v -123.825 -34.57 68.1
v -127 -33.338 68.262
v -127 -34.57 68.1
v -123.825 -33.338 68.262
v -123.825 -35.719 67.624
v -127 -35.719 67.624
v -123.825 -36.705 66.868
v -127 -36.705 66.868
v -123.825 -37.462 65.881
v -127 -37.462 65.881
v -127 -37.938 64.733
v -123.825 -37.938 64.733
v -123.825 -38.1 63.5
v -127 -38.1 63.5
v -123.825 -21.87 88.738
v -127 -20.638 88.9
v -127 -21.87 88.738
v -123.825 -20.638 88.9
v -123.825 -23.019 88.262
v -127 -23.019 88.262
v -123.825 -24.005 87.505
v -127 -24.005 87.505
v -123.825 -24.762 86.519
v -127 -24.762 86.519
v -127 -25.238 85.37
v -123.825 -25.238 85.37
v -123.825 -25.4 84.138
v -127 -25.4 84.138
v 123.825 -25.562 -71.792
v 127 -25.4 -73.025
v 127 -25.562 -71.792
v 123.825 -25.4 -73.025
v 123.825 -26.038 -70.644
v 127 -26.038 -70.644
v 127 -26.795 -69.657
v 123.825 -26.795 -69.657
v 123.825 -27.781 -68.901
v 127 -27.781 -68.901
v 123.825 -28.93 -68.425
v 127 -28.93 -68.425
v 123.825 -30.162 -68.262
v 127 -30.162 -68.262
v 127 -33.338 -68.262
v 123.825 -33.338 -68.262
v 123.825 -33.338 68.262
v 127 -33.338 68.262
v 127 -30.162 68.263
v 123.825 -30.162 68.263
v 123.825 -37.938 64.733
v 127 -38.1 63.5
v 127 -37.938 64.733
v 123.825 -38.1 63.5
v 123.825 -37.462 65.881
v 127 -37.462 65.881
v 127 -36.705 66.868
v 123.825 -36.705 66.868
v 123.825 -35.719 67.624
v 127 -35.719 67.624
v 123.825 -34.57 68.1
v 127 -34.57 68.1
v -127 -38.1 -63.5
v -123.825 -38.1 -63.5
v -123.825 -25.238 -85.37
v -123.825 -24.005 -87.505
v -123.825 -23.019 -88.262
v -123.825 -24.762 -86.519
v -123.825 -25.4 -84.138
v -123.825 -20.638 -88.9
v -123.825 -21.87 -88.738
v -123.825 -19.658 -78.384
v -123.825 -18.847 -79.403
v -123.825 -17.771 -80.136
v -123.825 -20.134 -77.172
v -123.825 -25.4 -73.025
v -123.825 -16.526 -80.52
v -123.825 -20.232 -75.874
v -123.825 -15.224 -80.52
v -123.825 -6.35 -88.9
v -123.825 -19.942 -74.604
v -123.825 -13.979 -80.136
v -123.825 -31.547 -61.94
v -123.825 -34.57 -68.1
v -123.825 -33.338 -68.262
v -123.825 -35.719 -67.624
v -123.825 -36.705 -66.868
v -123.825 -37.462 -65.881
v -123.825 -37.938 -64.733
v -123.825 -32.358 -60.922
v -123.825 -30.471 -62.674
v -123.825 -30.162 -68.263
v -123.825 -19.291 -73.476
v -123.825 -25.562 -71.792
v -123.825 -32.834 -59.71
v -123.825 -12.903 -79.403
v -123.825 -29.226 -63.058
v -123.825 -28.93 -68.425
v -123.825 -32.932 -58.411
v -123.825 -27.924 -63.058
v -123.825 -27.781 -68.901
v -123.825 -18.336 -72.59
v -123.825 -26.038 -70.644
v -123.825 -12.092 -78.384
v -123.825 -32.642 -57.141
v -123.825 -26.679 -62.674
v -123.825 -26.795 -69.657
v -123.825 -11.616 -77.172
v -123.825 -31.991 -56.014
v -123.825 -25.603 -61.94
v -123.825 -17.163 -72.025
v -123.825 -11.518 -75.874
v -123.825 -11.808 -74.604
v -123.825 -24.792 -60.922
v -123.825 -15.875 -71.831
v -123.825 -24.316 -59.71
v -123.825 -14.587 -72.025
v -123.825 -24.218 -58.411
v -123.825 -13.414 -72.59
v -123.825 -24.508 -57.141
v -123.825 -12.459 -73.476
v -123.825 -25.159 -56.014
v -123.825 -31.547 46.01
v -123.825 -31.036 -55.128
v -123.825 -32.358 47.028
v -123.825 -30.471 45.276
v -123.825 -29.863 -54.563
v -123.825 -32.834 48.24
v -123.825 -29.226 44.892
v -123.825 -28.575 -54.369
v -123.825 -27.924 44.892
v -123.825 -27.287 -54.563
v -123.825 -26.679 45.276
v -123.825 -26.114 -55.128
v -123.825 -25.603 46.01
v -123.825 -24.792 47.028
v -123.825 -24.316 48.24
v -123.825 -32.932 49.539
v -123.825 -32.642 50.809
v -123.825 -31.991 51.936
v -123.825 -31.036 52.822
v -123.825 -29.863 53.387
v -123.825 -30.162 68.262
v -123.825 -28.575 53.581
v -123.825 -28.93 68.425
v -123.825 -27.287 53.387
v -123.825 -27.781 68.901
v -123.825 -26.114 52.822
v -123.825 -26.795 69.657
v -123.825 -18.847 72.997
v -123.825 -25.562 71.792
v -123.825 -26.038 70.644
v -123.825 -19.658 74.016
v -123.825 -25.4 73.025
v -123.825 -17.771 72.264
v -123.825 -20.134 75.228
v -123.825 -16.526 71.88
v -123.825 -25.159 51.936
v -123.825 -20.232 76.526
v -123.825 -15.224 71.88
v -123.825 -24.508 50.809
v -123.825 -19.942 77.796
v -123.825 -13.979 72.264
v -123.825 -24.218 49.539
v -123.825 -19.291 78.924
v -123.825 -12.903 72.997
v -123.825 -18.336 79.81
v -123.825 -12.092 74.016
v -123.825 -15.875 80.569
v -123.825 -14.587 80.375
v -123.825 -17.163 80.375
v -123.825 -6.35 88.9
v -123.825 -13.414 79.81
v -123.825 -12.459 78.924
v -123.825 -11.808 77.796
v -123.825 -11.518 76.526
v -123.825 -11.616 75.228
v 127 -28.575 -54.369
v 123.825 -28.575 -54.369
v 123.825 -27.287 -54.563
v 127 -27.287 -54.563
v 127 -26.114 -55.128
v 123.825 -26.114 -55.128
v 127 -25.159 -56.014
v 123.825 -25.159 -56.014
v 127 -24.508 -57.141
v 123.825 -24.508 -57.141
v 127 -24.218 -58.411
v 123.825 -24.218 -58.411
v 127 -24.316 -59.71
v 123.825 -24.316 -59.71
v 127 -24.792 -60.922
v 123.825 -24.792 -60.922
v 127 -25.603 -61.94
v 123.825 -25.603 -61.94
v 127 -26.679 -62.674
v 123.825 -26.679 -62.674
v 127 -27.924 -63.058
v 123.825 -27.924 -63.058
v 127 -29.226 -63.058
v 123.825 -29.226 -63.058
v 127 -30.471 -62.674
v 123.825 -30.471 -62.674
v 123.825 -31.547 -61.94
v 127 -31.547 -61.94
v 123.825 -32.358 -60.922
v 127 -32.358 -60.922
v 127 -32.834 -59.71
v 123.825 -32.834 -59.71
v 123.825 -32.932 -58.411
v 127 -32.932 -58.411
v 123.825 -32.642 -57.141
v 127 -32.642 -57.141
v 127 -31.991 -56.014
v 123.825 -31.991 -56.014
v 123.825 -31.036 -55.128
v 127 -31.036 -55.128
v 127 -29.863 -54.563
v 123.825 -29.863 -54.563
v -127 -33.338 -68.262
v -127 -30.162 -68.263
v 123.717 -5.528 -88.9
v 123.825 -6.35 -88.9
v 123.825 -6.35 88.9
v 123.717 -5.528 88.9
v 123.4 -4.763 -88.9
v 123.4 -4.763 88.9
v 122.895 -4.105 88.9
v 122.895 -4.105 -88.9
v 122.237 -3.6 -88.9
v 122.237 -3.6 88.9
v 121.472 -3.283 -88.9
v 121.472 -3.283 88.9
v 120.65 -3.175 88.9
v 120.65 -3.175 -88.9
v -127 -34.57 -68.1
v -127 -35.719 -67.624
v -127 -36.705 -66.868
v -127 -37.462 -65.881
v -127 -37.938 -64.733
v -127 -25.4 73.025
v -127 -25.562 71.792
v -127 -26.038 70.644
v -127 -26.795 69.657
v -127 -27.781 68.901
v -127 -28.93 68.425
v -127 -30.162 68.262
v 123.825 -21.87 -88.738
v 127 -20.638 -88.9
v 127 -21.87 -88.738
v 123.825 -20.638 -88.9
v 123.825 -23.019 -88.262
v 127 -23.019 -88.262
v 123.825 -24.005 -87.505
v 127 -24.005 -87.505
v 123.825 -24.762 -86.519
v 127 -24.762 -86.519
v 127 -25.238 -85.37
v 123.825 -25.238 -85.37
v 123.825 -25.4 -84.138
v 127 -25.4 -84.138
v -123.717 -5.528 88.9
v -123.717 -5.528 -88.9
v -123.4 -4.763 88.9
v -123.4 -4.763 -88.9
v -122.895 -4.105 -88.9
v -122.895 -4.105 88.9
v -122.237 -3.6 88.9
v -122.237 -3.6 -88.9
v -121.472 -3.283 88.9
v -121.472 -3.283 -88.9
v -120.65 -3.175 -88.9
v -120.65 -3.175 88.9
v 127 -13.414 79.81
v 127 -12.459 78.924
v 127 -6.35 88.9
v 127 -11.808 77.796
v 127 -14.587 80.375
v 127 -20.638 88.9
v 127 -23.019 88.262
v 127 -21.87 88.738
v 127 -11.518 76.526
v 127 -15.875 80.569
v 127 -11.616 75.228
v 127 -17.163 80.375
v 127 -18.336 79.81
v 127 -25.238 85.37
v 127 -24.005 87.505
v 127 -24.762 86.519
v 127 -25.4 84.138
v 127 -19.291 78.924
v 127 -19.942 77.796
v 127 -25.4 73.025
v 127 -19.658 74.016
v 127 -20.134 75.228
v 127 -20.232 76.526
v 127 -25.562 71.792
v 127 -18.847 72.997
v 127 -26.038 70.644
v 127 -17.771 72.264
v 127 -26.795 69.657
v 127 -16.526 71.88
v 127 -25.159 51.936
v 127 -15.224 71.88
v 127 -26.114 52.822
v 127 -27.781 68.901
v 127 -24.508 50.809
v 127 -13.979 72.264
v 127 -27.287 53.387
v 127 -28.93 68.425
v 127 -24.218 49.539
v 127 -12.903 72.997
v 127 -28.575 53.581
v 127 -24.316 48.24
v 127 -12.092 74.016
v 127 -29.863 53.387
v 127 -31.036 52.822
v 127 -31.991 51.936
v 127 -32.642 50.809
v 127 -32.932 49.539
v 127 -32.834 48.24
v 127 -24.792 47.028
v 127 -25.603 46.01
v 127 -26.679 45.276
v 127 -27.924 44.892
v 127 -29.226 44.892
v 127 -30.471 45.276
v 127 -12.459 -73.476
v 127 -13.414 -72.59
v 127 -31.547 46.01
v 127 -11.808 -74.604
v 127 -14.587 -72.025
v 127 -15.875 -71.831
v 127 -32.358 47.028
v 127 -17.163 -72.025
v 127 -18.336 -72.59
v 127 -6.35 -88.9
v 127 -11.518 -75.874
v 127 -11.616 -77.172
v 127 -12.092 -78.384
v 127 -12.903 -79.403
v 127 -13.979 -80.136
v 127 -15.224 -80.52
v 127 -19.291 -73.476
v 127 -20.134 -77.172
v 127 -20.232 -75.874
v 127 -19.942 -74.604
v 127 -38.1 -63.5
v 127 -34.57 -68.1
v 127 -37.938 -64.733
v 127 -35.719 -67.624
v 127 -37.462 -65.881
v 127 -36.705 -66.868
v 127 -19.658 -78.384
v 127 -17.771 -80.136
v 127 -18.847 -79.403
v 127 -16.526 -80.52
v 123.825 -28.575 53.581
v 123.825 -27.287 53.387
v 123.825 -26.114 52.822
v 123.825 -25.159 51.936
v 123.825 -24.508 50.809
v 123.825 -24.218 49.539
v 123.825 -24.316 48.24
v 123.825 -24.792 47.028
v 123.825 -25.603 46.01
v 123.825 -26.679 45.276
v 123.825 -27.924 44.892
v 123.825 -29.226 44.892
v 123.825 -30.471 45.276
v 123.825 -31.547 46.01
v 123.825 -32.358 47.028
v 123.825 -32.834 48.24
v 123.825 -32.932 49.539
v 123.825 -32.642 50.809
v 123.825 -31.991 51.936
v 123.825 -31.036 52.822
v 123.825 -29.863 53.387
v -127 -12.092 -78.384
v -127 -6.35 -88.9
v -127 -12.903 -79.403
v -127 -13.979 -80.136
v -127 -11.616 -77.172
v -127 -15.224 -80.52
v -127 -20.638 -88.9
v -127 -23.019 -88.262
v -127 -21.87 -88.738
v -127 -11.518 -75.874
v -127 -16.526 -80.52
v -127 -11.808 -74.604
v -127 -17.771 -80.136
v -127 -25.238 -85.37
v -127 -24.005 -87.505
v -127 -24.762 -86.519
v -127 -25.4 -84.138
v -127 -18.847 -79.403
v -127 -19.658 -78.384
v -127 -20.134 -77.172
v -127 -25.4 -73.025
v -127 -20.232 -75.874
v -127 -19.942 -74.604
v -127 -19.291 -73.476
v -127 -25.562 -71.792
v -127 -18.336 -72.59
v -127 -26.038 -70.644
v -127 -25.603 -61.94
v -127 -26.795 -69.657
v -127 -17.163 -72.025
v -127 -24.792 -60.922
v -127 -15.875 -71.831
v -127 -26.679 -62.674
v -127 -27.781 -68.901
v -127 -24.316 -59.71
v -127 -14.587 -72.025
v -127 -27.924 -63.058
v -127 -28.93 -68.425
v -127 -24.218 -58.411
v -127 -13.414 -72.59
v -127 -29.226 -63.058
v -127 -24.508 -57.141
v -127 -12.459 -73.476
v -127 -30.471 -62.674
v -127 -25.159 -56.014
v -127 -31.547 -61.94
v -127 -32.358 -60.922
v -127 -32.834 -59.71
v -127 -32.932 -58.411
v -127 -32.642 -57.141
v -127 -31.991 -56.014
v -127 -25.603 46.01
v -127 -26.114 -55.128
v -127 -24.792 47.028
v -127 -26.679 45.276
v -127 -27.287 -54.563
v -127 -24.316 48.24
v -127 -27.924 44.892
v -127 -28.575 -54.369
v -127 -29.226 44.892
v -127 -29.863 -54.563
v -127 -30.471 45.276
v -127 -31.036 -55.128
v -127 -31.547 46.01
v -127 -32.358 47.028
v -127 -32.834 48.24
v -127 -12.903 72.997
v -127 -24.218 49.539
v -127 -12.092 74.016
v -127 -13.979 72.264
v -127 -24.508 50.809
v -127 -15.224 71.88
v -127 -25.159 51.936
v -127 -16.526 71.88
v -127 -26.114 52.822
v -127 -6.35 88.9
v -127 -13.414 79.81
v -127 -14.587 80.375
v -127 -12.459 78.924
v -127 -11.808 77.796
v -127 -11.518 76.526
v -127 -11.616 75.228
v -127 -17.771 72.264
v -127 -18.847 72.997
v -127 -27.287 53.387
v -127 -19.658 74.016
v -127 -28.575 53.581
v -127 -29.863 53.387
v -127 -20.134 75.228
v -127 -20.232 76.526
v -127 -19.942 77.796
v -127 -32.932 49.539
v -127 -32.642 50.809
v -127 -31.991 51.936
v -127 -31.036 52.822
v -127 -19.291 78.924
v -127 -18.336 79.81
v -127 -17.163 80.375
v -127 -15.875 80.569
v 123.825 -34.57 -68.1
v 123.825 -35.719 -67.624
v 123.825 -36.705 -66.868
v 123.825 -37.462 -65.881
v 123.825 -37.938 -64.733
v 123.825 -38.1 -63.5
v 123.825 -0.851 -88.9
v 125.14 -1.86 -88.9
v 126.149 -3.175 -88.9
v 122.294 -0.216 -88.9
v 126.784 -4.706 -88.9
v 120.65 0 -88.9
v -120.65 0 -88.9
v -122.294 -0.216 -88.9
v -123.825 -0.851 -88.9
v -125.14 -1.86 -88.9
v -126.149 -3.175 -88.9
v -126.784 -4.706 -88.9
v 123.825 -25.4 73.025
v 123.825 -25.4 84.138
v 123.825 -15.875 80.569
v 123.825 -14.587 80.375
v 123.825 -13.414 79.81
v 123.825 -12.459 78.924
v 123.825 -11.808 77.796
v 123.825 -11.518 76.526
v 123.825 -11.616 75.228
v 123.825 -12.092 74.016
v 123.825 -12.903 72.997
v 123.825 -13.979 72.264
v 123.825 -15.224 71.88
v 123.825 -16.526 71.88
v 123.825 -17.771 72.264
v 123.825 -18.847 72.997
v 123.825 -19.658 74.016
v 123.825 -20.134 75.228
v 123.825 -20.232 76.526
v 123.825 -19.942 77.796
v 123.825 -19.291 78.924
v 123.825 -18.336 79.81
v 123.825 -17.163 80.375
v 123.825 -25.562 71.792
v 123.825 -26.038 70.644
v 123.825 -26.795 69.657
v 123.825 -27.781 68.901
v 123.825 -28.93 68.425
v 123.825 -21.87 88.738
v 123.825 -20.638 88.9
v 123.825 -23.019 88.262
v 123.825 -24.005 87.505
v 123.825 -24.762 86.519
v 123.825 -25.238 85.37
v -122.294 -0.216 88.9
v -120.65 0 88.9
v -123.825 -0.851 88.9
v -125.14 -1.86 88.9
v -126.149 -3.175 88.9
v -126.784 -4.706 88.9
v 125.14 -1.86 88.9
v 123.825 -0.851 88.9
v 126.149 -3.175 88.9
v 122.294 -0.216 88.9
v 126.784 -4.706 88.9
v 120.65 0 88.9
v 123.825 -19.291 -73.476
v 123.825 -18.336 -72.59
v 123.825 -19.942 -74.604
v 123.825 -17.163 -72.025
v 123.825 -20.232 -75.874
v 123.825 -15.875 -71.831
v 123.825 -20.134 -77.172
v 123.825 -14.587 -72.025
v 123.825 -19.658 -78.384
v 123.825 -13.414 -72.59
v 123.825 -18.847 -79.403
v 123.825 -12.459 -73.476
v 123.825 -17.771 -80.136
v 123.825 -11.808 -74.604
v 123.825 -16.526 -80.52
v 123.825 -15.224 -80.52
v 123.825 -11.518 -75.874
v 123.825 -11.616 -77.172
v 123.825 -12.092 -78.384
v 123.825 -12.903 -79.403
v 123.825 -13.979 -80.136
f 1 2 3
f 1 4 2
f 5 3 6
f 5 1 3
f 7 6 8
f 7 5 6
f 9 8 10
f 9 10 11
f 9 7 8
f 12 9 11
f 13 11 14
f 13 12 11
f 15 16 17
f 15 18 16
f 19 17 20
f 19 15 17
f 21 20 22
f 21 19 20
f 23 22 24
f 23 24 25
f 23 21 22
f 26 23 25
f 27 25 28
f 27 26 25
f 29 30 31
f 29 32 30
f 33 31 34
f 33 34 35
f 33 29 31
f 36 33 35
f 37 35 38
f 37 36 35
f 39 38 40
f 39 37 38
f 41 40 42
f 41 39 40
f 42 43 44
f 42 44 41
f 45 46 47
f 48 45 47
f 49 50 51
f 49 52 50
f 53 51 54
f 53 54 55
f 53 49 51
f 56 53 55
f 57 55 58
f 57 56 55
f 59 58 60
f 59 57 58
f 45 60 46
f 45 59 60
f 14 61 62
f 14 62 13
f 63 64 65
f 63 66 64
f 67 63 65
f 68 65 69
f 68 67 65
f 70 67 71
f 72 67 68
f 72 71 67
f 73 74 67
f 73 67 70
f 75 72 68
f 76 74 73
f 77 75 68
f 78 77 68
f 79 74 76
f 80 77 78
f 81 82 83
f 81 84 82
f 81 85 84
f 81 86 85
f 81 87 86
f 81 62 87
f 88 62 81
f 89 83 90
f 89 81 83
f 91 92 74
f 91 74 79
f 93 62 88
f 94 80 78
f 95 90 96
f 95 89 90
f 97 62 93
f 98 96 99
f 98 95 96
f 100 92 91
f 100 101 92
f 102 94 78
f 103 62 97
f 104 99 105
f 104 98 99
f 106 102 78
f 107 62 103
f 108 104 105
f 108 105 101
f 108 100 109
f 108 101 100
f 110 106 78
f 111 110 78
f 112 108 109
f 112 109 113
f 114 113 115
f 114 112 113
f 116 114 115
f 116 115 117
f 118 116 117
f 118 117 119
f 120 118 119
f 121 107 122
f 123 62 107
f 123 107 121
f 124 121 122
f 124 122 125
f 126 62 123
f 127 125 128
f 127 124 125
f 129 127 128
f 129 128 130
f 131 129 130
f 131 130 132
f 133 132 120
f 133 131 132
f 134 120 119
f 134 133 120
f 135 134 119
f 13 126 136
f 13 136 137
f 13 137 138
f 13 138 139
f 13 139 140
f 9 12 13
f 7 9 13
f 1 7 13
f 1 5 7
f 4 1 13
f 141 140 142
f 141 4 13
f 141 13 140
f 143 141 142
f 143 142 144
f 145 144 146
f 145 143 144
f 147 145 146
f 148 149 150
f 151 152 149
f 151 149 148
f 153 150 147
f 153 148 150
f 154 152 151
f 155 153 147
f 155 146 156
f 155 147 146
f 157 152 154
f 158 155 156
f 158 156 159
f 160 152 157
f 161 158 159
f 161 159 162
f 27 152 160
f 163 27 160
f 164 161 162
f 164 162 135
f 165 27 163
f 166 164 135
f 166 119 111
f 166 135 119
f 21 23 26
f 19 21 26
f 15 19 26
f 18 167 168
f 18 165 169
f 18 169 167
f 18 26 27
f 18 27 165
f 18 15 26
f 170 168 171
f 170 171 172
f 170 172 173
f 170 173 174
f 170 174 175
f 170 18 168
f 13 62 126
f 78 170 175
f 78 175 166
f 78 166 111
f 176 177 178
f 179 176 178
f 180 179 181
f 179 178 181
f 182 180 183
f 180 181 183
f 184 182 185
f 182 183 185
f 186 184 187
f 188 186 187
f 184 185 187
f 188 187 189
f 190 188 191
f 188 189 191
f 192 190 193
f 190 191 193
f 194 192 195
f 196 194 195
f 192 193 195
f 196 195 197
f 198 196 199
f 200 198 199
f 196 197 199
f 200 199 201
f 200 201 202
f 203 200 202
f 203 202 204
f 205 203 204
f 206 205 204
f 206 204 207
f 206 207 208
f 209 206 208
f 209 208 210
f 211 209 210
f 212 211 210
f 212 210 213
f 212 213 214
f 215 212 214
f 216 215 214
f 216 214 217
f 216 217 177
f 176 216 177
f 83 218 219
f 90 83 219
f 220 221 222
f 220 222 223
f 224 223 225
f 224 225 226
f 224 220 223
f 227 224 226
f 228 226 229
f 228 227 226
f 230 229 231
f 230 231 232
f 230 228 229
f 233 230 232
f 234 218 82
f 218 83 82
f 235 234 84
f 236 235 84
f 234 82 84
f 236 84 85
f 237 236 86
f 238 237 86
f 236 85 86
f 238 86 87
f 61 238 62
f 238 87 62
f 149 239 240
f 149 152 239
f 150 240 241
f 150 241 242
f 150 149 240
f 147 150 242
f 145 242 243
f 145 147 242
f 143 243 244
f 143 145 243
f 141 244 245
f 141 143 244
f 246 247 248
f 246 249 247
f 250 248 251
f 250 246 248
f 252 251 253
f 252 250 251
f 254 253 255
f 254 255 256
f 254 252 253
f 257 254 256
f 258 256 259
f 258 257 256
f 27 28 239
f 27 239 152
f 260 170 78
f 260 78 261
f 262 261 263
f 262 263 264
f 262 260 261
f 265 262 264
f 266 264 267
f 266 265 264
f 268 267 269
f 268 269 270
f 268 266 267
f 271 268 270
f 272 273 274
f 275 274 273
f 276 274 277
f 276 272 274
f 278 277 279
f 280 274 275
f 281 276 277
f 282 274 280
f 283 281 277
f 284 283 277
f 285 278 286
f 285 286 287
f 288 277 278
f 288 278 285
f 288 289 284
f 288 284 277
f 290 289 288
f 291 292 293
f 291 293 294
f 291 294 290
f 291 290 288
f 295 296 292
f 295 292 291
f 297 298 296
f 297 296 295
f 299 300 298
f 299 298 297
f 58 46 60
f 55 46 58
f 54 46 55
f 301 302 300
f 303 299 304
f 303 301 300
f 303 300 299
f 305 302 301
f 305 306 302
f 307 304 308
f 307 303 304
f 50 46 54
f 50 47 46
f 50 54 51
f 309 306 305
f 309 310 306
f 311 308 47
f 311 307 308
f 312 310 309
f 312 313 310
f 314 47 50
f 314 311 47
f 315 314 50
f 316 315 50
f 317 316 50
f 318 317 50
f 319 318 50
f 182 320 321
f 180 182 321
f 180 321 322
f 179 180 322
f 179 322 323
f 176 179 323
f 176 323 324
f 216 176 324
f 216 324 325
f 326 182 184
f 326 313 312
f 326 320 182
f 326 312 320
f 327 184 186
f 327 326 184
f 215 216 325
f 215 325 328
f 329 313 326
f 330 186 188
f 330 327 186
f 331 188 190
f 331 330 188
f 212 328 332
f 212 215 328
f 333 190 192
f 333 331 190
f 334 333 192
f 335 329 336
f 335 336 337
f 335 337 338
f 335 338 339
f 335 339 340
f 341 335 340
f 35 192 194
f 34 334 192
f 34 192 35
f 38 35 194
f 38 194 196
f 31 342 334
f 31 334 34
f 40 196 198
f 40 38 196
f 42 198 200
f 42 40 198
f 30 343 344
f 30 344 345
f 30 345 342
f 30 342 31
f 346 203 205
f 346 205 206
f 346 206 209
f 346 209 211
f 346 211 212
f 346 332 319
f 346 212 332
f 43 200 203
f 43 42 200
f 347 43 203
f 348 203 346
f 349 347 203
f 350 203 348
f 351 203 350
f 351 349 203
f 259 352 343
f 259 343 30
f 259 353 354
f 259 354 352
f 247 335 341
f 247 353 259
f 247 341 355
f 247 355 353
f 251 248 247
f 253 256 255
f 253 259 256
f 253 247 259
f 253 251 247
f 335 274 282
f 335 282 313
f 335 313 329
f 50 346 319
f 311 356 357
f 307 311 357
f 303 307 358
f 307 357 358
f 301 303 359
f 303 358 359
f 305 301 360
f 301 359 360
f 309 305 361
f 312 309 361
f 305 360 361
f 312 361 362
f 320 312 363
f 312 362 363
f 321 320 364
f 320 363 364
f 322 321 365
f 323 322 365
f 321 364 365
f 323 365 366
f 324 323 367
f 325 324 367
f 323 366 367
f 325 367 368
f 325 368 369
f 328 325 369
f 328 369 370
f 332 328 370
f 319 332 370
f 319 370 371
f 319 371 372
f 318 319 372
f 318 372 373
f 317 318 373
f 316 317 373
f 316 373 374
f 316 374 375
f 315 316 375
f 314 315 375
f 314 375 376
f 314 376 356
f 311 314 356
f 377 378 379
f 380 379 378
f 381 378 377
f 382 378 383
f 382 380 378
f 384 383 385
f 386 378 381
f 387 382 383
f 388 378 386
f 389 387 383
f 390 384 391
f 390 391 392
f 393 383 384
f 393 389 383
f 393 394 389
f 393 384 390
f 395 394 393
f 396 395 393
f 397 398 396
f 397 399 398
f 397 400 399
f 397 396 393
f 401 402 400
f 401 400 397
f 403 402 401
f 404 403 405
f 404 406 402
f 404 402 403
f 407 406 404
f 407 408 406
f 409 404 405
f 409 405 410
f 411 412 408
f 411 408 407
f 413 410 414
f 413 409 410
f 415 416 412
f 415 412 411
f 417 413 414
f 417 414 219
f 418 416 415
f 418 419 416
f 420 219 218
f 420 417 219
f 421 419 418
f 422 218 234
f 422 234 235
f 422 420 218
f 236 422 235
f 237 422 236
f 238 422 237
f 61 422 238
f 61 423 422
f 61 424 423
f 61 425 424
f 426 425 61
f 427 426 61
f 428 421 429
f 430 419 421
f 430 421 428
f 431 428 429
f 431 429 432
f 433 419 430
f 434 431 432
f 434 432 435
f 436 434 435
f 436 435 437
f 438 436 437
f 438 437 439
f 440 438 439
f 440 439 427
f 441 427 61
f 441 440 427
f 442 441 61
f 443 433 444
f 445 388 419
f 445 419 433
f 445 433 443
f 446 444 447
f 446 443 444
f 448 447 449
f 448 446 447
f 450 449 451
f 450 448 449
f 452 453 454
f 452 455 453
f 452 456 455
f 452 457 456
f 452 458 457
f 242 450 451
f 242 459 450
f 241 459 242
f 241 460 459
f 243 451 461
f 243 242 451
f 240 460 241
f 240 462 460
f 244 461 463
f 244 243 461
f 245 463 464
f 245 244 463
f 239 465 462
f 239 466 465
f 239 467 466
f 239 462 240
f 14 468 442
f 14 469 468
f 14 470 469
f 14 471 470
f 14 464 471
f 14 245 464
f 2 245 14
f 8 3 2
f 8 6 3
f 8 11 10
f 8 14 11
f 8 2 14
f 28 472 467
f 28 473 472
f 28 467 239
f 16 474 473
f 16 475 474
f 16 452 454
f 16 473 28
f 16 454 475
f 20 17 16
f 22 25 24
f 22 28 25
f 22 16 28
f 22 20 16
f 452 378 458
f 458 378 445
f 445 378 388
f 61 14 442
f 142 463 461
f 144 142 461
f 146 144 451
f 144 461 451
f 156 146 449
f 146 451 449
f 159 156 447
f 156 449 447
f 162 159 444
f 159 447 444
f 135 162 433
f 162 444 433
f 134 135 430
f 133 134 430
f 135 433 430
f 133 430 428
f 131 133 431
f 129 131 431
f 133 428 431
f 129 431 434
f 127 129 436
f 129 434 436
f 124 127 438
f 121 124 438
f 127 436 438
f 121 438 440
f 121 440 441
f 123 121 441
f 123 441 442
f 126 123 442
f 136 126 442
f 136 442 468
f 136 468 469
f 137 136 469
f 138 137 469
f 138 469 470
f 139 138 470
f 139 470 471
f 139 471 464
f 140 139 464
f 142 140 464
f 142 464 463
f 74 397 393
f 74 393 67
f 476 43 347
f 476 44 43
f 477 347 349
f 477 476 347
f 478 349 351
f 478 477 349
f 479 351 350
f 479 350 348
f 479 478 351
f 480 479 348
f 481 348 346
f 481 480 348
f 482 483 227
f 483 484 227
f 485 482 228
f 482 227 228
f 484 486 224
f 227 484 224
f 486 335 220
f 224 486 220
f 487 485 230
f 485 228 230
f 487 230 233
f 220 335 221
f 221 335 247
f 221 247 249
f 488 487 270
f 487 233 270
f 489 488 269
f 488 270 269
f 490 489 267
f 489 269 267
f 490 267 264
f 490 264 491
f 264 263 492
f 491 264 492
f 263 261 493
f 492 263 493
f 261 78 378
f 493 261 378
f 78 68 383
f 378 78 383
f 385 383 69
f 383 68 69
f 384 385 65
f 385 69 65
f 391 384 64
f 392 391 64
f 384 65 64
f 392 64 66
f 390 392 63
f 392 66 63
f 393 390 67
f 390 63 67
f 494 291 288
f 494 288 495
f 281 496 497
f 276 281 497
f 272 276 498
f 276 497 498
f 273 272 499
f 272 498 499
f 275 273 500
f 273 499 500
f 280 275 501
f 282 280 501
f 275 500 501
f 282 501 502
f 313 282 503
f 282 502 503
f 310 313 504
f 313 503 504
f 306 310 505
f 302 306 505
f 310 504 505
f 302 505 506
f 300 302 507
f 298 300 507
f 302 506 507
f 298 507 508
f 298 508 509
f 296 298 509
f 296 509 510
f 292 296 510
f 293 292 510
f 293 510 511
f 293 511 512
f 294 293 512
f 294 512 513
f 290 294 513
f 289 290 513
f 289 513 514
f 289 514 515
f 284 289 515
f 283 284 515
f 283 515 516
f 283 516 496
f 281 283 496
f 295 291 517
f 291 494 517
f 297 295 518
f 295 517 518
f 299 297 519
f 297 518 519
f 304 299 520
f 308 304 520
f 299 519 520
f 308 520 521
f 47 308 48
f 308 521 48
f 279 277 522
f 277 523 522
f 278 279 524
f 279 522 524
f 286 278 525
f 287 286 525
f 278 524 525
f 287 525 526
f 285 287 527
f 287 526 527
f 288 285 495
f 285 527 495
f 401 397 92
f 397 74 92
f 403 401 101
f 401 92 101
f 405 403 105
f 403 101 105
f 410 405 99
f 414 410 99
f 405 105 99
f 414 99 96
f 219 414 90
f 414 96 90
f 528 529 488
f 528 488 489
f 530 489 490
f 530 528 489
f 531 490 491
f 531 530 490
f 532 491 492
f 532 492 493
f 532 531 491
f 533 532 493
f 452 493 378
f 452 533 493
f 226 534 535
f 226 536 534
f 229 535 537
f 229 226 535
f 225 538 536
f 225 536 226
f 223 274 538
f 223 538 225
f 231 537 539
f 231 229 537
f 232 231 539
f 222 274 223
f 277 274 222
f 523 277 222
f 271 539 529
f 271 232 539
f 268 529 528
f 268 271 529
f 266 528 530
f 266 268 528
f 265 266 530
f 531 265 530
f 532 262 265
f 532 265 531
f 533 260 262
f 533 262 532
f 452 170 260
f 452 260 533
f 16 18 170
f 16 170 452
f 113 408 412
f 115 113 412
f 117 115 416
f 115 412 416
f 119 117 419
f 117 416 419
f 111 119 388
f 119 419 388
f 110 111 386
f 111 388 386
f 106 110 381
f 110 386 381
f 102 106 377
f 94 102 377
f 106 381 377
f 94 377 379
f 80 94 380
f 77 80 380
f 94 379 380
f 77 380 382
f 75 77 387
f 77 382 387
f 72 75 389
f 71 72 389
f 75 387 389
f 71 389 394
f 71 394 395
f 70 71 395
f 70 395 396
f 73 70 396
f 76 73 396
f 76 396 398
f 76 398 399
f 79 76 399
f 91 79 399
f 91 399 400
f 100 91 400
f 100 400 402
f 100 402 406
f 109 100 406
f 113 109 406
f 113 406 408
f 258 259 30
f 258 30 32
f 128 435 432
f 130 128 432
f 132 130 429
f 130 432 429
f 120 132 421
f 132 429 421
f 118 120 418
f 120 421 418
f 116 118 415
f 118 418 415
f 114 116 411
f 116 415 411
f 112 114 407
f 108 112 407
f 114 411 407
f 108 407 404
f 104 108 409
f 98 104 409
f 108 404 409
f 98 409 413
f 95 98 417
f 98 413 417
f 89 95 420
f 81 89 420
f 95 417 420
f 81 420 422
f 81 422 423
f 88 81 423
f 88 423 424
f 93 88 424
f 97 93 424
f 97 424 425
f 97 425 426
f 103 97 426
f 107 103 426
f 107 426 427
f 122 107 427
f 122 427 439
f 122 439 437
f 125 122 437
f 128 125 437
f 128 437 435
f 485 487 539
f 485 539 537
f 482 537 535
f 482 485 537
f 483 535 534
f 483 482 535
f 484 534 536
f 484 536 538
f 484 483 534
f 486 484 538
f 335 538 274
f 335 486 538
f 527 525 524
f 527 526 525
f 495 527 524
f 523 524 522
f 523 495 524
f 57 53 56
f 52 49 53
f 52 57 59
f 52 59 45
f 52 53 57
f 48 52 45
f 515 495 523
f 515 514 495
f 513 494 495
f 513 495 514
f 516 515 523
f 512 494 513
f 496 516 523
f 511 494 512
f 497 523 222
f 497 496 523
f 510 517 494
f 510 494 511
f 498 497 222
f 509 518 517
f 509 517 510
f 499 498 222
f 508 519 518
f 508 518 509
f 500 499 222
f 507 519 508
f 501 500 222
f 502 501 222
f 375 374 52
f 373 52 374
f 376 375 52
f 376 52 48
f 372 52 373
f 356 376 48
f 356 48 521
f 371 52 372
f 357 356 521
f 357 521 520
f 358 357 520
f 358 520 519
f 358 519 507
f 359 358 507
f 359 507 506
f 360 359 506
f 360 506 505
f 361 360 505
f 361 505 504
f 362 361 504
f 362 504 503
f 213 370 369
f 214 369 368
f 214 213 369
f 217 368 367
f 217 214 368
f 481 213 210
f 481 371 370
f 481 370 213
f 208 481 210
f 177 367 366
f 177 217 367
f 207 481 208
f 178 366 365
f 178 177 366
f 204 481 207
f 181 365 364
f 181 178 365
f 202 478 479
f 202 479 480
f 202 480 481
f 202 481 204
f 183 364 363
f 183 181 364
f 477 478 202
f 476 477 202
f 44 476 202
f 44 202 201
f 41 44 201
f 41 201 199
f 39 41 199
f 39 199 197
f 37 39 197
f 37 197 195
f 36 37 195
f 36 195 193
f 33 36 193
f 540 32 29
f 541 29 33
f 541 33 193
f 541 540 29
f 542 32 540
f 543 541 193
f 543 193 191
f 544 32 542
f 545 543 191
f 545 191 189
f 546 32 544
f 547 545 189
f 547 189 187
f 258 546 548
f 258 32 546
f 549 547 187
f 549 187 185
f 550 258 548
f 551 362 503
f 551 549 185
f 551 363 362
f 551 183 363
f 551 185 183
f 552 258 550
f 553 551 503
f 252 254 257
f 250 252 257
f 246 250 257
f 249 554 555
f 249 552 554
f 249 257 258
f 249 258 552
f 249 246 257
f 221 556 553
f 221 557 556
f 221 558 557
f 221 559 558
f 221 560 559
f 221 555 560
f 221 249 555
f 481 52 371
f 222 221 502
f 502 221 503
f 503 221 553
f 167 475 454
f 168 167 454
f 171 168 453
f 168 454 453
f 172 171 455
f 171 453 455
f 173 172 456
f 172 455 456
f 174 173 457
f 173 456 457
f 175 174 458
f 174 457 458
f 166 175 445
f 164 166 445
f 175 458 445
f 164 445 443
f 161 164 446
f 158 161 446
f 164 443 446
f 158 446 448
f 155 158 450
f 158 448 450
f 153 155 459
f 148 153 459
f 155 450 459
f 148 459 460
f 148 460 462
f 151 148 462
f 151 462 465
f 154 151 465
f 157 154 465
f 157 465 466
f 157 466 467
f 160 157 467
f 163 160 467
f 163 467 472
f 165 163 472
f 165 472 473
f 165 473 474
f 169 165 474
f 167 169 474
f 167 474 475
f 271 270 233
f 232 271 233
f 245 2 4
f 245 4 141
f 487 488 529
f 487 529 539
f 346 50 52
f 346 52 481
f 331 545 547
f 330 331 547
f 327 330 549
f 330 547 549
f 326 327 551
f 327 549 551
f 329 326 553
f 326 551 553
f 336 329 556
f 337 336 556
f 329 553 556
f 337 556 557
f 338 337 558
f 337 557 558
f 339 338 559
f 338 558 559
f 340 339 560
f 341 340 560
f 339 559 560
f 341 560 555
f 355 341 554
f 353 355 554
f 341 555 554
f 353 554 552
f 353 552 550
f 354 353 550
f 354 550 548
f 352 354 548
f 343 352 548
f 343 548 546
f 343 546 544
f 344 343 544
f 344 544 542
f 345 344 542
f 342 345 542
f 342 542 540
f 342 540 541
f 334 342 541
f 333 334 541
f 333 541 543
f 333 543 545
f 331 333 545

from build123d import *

# Parameters (mm, degrees)
SKETCH1_W                                 = 241.3
SKETCH1_H                                 = 177.8
BASE_FLANGE1_DEPTH                        = 3.175
EDGE_FLANGE1_DEPTH                        = 177.8
EDGE_FLANGE1_BEND_DEPTH                   = 177.8
SKETCH13_W                                = 136.525
SKETCH13_H                                = 12.7
BOSS_EXTRUDE1_DEPTH                       = 3.175
SKETCH39_W                                = 136.525
SKETCH39_H                                = 12.7
BOSS_EXTRUDE2_DEPTH                       = 3.175
HOLE_FOR_1_4_SELF_CLINCHING_NUTS_S_SS_C_D = 8.7376
FILLET2_R                                 = 4.7625


# Sheet-metal steps are written as plain solids
with BuildPart() as part:
    # Sketch1 → Base-Flange1 (new body)
    with BuildSketch(Plane(origin=(0, 0, 0), x_dir=(1, 0, 0), z_dir=(0, 1, 0))):
        Rectangle(SKETCH1_W, SKETCH1_H)
    extrude(amount=-BASE_FLANGE1_DEPTH)

    # Edge-Flange1 section (across the edge) → Edge-Flange1 (add)
    with BuildSketch(Plane(origin=(123.825, -3.175, -88.9), x_dir=(-1, 0, 0), z_dir=(0, 0, 1))):
        with BuildLine():
            Line((-3.175, 3.175), (-3.175, 22.225))
            Line((-3.175, 22.225), (0, 22.225))
            Line((0, 22.225), (0, 3.175))
            ThreePointArc((0, 3.175), (0.92993597, 0.92993597), (3.175, 0))
            Line((3.175, 0), (3.175, -3.175))
            ThreePointArc((3.175, -3.175), (-1.315128061, -1.315128061), (-3.175, 3.175))
        make_face()
    extrude(amount=EDGE_FLANGE1_DEPTH)

    # Edge-Flange1 section 2 (across the edge) → Edge-Flange1 bend (add)
    with BuildSketch(Plane(origin=(-123.825, -3.175, 88.9), x_dir=(1, 0, 0), z_dir=(0, 0, -1))):
        with BuildLine():
            Line((-3.175, 3.175), (-3.175, 22.225))
            Line((-3.175, 22.225), (0, 22.225))
            Line((0, 22.225), (0, 3.175))
            ThreePointArc((0, 3.175), (0.92993597, 0.92993597), (3.175, 0))
            Line((3.175, 0), (3.175, -3.175))
            ThreePointArc((3.175, -3.175), (-1.315128061, -1.315128061), (-3.175, 3.175))
        make_face()
    extrude(amount=EDGE_FLANGE1_BEND_DEPTH)

    # Sketch13 → Boss-Extrude1 (add)
    with BuildSketch(Plane(origin=(127, 0, 0), x_dir=(0, 0, -1), z_dir=(1, 0, 0))):
        with Locations((0, -31.75)):
            Rectangle(SKETCH13_W, SKETCH13_H)
    extrude(amount=-BOSS_EXTRUDE1_DEPTH)

    # Sketch39 → Boss-Extrude2 (add)
    with BuildSketch(Plane.ZY.offset(127)):
        with Locations((0, -31.75)):
            Rectangle(SKETCH39_W, SKETCH39_H)
    extrude(amount=-BOSS_EXTRUDE2_DEPTH)

    # Hole for 1/4 Self-clinching Nuts (S,SS,CLS,CLSS)1 (through all)
    with Locations(Plane(origin=(127, 0, 0), x_dir=(0, 0, -1), z_dir=(1, 0, 0))):
        with Locations((-76.2, -15.875), (76.2, -15.875), (58.7375, -28.575), (-49.2125, -28.575)):
            Hole(HOLE_FOR_1_4_SELF_CLINCHING_NUTS_S_SS_C_D / 2)

    # Fillet2
    fillet2_edges = [part.edges().sort_by_distance(p)[0] for p in [
        (125.4125, -25.4, -88.9),
        (125.4125, -25.4, 88.9),
        (-125.4125, -25.4, 88.9),
        (-125.4125, -25.4, -88.9),
        (125.4125, -38.1, -68.2625),
        (125.4125, -25.4, -68.2625),
        (125.4125, -25.4, 68.2625),
        (125.4125, -38.1, 68.2625),
        (-125.4125, -25.4, -68.2625),
        (-125.4125, -38.1, -68.2625),
        (-125.4125, -38.1, 68.2625),
        (-125.4125, -25.4, 68.2625),
    ]]
    fillet(fillet2_edges, radius=FILLET2_R)


solid = part.part
